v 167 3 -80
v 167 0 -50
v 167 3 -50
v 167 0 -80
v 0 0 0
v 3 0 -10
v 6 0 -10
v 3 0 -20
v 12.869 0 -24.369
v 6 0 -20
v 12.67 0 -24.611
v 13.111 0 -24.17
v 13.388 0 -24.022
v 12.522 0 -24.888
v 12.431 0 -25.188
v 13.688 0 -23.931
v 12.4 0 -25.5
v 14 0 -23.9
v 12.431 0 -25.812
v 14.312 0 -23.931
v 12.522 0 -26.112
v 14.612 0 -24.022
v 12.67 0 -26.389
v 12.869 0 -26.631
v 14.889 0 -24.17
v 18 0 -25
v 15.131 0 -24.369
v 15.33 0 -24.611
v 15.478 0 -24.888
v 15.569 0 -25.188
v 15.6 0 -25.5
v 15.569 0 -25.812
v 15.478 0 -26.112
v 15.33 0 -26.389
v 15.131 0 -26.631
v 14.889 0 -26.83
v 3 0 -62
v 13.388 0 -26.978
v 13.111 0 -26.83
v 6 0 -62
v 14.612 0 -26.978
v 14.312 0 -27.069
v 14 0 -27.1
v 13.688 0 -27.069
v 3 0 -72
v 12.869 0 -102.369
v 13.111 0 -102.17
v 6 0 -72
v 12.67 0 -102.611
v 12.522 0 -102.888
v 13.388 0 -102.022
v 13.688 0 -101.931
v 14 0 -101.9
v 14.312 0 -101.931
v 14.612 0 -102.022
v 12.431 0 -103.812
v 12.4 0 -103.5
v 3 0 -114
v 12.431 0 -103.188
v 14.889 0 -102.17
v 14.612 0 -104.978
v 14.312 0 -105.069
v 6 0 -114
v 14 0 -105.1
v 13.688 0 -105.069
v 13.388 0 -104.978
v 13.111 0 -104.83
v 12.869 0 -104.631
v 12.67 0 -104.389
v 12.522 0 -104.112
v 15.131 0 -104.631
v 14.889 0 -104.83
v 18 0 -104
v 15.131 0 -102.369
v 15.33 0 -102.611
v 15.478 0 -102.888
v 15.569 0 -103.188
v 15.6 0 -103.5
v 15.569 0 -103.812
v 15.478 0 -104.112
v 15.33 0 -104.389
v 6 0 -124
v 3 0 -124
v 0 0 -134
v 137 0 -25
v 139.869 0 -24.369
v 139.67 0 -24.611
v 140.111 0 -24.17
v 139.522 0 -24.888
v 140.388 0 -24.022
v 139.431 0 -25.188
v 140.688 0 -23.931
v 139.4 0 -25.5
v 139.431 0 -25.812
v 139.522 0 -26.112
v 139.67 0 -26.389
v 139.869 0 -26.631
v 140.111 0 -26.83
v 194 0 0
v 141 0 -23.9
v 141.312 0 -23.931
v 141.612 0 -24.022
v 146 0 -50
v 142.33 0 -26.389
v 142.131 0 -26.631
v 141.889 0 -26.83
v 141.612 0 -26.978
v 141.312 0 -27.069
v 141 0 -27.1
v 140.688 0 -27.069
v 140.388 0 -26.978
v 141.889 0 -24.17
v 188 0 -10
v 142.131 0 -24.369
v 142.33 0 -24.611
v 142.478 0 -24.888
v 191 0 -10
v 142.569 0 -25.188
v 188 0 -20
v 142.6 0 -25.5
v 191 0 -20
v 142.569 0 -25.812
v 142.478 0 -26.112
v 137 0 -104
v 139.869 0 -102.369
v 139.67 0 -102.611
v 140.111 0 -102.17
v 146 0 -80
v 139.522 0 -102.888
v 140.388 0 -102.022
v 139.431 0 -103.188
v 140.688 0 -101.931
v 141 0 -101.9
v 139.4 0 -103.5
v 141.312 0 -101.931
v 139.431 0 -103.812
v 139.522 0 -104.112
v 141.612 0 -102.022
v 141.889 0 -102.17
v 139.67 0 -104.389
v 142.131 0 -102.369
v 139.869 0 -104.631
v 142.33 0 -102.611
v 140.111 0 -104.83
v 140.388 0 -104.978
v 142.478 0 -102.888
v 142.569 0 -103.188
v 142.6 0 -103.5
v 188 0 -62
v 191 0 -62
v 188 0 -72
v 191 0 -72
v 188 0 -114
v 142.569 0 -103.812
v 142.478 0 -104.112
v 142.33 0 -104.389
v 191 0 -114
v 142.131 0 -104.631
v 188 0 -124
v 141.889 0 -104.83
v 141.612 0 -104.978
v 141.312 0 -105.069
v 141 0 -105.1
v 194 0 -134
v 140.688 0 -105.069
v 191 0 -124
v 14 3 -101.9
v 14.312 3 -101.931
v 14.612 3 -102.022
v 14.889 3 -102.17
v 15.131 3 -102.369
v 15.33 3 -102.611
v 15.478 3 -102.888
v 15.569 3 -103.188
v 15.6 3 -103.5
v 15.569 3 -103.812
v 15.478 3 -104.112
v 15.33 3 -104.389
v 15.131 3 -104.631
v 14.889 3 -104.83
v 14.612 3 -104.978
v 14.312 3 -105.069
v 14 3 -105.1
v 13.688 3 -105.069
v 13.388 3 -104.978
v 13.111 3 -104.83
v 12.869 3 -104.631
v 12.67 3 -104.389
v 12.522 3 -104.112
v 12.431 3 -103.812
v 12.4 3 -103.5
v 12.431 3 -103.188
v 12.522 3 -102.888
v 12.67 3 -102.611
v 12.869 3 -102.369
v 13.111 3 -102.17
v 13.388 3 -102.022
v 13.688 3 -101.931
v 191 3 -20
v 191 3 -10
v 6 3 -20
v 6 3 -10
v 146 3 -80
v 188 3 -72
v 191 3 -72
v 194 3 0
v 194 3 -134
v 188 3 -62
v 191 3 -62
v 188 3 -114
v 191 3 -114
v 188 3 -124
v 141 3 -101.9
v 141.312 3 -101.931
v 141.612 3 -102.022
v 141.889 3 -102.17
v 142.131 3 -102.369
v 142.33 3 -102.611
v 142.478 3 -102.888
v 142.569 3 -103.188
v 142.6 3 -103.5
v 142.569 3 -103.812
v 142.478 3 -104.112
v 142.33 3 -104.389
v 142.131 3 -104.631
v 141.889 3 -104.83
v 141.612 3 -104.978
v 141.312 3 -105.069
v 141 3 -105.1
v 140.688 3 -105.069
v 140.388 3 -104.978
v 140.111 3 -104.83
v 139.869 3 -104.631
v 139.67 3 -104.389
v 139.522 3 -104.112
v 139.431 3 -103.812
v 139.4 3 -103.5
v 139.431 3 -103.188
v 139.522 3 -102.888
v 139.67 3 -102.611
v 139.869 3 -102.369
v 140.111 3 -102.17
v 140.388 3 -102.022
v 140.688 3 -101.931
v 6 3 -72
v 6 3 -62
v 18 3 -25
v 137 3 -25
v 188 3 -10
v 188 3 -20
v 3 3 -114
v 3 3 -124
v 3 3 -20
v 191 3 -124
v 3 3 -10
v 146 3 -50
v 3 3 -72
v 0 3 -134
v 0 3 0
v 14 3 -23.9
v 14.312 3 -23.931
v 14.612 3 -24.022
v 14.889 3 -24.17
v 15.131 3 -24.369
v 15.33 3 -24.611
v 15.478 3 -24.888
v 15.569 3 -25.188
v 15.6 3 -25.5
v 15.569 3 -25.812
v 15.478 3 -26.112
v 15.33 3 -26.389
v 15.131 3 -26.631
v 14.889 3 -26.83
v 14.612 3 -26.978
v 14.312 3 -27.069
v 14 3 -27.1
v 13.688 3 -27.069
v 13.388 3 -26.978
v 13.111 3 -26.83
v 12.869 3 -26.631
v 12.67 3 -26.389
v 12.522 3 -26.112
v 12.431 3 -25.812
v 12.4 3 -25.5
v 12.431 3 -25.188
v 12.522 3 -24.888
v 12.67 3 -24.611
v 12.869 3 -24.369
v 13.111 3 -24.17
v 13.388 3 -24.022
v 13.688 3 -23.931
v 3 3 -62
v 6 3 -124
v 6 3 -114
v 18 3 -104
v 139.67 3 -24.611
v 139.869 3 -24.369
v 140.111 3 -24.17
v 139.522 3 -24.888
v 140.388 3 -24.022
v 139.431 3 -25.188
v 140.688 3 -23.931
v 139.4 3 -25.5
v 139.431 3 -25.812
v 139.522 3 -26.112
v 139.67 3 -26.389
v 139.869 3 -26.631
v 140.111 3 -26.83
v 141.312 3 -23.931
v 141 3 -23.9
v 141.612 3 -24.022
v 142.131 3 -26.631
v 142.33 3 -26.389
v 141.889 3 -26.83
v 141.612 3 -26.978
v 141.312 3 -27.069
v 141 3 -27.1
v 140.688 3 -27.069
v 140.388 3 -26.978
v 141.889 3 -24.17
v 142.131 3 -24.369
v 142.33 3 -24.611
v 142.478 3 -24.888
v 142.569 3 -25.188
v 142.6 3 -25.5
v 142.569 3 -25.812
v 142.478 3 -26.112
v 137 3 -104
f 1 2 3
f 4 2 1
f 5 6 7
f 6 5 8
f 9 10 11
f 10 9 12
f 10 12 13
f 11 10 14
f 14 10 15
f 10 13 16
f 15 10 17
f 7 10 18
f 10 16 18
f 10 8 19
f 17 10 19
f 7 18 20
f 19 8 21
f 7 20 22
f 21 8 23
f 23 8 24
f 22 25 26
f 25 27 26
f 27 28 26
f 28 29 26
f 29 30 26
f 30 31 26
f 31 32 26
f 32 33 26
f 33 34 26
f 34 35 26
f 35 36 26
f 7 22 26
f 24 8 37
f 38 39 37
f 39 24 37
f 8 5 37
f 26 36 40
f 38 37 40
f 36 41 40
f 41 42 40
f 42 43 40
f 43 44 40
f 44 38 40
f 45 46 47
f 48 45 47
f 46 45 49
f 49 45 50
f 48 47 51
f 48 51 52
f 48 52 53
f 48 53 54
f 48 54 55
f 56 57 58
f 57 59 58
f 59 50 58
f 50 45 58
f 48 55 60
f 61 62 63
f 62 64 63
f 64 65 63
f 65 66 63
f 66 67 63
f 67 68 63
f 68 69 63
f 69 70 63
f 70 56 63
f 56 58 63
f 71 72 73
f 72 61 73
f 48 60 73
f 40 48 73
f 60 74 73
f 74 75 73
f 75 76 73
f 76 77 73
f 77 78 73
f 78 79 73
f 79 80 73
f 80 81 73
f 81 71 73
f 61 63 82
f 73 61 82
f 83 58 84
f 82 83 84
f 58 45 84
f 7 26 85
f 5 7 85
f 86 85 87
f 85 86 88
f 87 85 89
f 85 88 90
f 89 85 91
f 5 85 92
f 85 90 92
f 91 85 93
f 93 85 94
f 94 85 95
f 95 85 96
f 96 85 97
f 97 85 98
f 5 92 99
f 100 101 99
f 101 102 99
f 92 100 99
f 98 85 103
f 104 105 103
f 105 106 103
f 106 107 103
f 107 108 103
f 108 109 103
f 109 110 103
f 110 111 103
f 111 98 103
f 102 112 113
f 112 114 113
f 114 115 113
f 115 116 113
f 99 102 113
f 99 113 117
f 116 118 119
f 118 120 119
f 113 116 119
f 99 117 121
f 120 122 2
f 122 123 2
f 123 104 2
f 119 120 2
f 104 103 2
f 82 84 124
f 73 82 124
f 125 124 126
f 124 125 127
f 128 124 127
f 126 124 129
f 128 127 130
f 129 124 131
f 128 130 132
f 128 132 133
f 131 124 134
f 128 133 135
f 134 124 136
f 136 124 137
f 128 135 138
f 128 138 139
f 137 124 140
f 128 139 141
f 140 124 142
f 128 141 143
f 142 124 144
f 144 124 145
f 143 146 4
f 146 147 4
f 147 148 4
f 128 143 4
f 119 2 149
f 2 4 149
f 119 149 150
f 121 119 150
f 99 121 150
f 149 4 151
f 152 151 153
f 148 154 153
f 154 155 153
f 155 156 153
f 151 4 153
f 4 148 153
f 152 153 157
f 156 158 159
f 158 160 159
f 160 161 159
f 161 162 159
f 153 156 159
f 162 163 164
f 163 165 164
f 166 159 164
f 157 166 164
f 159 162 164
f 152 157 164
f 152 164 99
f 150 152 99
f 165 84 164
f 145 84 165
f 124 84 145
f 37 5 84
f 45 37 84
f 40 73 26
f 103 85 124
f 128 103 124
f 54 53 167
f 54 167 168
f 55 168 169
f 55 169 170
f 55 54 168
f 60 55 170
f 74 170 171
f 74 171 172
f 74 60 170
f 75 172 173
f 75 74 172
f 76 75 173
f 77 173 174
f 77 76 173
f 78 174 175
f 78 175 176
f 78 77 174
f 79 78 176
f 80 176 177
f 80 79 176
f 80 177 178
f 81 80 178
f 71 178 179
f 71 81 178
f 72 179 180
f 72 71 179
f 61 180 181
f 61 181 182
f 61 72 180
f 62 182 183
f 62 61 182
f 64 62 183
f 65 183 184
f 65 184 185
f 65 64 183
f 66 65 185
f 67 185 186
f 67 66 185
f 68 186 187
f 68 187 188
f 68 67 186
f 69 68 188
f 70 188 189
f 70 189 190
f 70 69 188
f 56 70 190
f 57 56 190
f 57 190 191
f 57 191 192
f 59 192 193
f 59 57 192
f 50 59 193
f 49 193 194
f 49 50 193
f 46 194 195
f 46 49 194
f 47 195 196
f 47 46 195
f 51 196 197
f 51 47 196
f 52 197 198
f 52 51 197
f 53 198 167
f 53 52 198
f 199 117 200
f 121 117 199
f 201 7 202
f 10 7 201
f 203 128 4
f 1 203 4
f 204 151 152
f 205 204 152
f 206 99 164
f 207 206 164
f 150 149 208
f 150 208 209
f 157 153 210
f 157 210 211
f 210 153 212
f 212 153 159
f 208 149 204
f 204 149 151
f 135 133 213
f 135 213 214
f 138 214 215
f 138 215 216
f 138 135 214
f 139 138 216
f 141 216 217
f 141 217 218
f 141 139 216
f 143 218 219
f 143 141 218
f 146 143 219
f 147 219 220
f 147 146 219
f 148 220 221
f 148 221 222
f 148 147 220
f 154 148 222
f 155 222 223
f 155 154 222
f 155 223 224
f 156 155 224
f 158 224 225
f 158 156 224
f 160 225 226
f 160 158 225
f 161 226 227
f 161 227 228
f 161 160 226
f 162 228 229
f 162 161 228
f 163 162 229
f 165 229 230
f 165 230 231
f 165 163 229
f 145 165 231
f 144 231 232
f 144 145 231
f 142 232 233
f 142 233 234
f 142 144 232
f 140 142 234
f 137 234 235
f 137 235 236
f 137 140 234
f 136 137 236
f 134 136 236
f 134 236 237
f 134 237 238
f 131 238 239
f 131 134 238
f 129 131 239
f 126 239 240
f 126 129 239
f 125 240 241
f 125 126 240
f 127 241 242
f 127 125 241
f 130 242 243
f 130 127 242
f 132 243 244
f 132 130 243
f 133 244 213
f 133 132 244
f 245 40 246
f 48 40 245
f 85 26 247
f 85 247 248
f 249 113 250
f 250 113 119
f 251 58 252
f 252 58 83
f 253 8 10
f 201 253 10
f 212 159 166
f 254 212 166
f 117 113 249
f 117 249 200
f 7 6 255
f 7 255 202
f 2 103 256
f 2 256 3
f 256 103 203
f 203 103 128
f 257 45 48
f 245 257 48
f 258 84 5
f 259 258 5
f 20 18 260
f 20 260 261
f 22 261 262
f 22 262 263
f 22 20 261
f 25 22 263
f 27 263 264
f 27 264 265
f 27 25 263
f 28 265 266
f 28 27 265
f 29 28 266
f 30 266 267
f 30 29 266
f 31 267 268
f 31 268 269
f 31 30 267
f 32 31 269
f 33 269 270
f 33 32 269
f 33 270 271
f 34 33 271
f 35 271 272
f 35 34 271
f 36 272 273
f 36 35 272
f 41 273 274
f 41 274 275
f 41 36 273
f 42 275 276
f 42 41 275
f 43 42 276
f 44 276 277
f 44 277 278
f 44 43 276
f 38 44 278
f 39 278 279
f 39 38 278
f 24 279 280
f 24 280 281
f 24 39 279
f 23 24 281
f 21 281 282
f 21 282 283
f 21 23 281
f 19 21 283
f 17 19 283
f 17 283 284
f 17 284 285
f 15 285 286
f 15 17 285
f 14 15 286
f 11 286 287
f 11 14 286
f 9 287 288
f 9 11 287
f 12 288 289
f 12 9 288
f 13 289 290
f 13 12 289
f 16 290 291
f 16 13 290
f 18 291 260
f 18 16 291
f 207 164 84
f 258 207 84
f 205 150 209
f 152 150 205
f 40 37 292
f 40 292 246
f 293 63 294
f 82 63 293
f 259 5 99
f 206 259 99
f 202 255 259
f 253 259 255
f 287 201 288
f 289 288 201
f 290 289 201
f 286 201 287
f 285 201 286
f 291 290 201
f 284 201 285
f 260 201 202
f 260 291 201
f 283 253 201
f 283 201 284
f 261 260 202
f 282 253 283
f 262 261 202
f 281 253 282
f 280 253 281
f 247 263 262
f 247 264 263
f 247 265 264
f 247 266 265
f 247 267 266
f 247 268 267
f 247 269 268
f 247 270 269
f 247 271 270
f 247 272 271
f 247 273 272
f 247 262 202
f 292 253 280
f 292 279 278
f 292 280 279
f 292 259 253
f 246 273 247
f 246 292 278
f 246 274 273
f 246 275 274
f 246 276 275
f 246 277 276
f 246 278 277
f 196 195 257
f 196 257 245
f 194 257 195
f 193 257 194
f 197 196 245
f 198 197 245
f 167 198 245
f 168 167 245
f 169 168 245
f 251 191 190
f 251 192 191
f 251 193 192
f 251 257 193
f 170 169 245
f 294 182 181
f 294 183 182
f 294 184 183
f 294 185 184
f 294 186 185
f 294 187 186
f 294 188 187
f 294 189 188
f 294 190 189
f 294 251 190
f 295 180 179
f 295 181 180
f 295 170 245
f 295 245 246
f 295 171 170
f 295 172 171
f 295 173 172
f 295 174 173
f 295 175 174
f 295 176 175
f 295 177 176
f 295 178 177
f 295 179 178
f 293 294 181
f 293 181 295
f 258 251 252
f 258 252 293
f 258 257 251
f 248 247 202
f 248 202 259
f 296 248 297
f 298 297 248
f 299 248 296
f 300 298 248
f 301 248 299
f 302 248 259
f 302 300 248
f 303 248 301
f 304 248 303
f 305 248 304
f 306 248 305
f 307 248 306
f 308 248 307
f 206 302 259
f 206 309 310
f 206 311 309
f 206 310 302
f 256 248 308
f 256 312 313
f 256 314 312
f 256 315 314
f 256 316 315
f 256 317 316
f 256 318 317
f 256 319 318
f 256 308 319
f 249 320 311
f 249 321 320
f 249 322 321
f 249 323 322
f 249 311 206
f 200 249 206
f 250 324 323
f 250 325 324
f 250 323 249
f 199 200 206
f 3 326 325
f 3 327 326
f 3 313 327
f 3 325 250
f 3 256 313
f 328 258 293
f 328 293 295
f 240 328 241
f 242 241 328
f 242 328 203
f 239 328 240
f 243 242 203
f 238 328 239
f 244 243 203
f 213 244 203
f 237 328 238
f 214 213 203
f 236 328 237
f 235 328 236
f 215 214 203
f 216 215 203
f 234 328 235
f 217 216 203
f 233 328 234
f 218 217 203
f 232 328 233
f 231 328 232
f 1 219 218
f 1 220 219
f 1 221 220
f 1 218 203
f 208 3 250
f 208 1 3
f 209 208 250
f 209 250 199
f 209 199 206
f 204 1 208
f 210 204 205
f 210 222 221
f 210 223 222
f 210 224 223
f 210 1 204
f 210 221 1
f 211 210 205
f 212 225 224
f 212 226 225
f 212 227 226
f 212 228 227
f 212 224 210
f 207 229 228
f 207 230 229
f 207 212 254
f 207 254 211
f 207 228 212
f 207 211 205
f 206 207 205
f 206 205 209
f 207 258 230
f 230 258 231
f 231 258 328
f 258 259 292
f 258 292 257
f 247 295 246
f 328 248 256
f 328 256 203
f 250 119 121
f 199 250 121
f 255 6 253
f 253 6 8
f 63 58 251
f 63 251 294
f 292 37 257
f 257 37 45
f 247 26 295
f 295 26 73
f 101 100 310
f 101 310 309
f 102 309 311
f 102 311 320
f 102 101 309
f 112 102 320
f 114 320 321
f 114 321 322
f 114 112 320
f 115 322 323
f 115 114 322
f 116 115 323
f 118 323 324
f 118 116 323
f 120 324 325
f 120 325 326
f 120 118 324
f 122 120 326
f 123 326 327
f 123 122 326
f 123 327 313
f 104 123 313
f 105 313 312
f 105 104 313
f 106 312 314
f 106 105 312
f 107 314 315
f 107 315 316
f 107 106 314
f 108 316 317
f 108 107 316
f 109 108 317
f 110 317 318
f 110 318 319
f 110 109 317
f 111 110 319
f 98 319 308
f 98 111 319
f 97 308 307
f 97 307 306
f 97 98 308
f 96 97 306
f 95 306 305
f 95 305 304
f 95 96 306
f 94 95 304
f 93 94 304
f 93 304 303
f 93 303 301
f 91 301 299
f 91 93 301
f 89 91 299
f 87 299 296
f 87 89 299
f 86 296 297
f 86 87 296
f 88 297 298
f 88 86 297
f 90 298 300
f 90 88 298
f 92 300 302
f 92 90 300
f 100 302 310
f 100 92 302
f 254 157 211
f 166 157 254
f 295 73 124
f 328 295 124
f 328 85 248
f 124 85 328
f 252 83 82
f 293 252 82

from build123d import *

# Parameters (mm, degrees)
SKETCH1_R           = 1.6
SKETCH1_W           = 119
SKETCH1_H           = 79
SKETCH1_W_2         = 21
SKETCH1_H_2         = 30
SKETCH1_W_3         = 3
SKETCH1_H_3         = 10
BOSS_EXTRUDE1_DEPTH = 3


with BuildPart() as part:
    # Sketch1 → Boss-Extrude1 (new body)
    with BuildSketch(Plane(origin=(0, 0, 0), x_dir=(1, 0, 0), z_dir=(0, 1, 0))):
        Polygon((0, 0), (194, 0), (194, 14.55), (194, 114.55), (194, 134), (0, 134), align=None)
        with Locations(Location((14, 103.5, 0), (0, 0, 270))):
            Circle(SKETCH1_R, mode=Mode.SUBTRACT)
        with Locations(Location((141, 103.5, 0), (0, 0, 270))):
            Circle(SKETCH1_R, mode=Mode.SUBTRACT)
        with Locations(Location((141, 25.5, 0), (0, 0, 270))):
            Circle(SKETCH1_R, mode=Mode.SUBTRACT)
        with Locations(Location((14, 25.5, 0), (0, 0, 270))):
            Circle(SKETCH1_R, mode=Mode.SUBTRACT)
        with Locations((77.5, 64.5)):
            Rectangle(SKETCH1_W, SKETCH1_H, mode=Mode.SUBTRACT)
        with Locations((156.5, 65)):
            Rectangle(SKETCH1_W_2, SKETCH1_H_2, mode=Mode.SUBTRACT)
        with Locations((4.5, 119)):
            Rectangle(SKETCH1_W_3, SKETCH1_H_3, mode=Mode.SUBTRACT)
        with Locations((4.5, 67)):
            Rectangle(SKETCH1_W_3, SKETCH1_H_3, mode=Mode.SUBTRACT)
        with Locations((4.5, 15)):
            Rectangle(SKETCH1_W_3, SKETCH1_H_3, mode=Mode.SUBTRACT)
        with Locations((189.5, 119)):
            Rectangle(SKETCH1_W_3, SKETCH1_H_3, mode=Mode.SUBTRACT)
        with Locations((189.5, 67)):
            Rectangle(SKETCH1_W_3, SKETCH1_H_3, mode=Mode.SUBTRACT)
        with Locations((189.5, 15)):
            Rectangle(SKETCH1_W_3, SKETCH1_H_3, mode=Mode.SUBTRACT)
    extrude(amount=BOSS_EXTRUDE1_DEPTH)


solid = part.part
